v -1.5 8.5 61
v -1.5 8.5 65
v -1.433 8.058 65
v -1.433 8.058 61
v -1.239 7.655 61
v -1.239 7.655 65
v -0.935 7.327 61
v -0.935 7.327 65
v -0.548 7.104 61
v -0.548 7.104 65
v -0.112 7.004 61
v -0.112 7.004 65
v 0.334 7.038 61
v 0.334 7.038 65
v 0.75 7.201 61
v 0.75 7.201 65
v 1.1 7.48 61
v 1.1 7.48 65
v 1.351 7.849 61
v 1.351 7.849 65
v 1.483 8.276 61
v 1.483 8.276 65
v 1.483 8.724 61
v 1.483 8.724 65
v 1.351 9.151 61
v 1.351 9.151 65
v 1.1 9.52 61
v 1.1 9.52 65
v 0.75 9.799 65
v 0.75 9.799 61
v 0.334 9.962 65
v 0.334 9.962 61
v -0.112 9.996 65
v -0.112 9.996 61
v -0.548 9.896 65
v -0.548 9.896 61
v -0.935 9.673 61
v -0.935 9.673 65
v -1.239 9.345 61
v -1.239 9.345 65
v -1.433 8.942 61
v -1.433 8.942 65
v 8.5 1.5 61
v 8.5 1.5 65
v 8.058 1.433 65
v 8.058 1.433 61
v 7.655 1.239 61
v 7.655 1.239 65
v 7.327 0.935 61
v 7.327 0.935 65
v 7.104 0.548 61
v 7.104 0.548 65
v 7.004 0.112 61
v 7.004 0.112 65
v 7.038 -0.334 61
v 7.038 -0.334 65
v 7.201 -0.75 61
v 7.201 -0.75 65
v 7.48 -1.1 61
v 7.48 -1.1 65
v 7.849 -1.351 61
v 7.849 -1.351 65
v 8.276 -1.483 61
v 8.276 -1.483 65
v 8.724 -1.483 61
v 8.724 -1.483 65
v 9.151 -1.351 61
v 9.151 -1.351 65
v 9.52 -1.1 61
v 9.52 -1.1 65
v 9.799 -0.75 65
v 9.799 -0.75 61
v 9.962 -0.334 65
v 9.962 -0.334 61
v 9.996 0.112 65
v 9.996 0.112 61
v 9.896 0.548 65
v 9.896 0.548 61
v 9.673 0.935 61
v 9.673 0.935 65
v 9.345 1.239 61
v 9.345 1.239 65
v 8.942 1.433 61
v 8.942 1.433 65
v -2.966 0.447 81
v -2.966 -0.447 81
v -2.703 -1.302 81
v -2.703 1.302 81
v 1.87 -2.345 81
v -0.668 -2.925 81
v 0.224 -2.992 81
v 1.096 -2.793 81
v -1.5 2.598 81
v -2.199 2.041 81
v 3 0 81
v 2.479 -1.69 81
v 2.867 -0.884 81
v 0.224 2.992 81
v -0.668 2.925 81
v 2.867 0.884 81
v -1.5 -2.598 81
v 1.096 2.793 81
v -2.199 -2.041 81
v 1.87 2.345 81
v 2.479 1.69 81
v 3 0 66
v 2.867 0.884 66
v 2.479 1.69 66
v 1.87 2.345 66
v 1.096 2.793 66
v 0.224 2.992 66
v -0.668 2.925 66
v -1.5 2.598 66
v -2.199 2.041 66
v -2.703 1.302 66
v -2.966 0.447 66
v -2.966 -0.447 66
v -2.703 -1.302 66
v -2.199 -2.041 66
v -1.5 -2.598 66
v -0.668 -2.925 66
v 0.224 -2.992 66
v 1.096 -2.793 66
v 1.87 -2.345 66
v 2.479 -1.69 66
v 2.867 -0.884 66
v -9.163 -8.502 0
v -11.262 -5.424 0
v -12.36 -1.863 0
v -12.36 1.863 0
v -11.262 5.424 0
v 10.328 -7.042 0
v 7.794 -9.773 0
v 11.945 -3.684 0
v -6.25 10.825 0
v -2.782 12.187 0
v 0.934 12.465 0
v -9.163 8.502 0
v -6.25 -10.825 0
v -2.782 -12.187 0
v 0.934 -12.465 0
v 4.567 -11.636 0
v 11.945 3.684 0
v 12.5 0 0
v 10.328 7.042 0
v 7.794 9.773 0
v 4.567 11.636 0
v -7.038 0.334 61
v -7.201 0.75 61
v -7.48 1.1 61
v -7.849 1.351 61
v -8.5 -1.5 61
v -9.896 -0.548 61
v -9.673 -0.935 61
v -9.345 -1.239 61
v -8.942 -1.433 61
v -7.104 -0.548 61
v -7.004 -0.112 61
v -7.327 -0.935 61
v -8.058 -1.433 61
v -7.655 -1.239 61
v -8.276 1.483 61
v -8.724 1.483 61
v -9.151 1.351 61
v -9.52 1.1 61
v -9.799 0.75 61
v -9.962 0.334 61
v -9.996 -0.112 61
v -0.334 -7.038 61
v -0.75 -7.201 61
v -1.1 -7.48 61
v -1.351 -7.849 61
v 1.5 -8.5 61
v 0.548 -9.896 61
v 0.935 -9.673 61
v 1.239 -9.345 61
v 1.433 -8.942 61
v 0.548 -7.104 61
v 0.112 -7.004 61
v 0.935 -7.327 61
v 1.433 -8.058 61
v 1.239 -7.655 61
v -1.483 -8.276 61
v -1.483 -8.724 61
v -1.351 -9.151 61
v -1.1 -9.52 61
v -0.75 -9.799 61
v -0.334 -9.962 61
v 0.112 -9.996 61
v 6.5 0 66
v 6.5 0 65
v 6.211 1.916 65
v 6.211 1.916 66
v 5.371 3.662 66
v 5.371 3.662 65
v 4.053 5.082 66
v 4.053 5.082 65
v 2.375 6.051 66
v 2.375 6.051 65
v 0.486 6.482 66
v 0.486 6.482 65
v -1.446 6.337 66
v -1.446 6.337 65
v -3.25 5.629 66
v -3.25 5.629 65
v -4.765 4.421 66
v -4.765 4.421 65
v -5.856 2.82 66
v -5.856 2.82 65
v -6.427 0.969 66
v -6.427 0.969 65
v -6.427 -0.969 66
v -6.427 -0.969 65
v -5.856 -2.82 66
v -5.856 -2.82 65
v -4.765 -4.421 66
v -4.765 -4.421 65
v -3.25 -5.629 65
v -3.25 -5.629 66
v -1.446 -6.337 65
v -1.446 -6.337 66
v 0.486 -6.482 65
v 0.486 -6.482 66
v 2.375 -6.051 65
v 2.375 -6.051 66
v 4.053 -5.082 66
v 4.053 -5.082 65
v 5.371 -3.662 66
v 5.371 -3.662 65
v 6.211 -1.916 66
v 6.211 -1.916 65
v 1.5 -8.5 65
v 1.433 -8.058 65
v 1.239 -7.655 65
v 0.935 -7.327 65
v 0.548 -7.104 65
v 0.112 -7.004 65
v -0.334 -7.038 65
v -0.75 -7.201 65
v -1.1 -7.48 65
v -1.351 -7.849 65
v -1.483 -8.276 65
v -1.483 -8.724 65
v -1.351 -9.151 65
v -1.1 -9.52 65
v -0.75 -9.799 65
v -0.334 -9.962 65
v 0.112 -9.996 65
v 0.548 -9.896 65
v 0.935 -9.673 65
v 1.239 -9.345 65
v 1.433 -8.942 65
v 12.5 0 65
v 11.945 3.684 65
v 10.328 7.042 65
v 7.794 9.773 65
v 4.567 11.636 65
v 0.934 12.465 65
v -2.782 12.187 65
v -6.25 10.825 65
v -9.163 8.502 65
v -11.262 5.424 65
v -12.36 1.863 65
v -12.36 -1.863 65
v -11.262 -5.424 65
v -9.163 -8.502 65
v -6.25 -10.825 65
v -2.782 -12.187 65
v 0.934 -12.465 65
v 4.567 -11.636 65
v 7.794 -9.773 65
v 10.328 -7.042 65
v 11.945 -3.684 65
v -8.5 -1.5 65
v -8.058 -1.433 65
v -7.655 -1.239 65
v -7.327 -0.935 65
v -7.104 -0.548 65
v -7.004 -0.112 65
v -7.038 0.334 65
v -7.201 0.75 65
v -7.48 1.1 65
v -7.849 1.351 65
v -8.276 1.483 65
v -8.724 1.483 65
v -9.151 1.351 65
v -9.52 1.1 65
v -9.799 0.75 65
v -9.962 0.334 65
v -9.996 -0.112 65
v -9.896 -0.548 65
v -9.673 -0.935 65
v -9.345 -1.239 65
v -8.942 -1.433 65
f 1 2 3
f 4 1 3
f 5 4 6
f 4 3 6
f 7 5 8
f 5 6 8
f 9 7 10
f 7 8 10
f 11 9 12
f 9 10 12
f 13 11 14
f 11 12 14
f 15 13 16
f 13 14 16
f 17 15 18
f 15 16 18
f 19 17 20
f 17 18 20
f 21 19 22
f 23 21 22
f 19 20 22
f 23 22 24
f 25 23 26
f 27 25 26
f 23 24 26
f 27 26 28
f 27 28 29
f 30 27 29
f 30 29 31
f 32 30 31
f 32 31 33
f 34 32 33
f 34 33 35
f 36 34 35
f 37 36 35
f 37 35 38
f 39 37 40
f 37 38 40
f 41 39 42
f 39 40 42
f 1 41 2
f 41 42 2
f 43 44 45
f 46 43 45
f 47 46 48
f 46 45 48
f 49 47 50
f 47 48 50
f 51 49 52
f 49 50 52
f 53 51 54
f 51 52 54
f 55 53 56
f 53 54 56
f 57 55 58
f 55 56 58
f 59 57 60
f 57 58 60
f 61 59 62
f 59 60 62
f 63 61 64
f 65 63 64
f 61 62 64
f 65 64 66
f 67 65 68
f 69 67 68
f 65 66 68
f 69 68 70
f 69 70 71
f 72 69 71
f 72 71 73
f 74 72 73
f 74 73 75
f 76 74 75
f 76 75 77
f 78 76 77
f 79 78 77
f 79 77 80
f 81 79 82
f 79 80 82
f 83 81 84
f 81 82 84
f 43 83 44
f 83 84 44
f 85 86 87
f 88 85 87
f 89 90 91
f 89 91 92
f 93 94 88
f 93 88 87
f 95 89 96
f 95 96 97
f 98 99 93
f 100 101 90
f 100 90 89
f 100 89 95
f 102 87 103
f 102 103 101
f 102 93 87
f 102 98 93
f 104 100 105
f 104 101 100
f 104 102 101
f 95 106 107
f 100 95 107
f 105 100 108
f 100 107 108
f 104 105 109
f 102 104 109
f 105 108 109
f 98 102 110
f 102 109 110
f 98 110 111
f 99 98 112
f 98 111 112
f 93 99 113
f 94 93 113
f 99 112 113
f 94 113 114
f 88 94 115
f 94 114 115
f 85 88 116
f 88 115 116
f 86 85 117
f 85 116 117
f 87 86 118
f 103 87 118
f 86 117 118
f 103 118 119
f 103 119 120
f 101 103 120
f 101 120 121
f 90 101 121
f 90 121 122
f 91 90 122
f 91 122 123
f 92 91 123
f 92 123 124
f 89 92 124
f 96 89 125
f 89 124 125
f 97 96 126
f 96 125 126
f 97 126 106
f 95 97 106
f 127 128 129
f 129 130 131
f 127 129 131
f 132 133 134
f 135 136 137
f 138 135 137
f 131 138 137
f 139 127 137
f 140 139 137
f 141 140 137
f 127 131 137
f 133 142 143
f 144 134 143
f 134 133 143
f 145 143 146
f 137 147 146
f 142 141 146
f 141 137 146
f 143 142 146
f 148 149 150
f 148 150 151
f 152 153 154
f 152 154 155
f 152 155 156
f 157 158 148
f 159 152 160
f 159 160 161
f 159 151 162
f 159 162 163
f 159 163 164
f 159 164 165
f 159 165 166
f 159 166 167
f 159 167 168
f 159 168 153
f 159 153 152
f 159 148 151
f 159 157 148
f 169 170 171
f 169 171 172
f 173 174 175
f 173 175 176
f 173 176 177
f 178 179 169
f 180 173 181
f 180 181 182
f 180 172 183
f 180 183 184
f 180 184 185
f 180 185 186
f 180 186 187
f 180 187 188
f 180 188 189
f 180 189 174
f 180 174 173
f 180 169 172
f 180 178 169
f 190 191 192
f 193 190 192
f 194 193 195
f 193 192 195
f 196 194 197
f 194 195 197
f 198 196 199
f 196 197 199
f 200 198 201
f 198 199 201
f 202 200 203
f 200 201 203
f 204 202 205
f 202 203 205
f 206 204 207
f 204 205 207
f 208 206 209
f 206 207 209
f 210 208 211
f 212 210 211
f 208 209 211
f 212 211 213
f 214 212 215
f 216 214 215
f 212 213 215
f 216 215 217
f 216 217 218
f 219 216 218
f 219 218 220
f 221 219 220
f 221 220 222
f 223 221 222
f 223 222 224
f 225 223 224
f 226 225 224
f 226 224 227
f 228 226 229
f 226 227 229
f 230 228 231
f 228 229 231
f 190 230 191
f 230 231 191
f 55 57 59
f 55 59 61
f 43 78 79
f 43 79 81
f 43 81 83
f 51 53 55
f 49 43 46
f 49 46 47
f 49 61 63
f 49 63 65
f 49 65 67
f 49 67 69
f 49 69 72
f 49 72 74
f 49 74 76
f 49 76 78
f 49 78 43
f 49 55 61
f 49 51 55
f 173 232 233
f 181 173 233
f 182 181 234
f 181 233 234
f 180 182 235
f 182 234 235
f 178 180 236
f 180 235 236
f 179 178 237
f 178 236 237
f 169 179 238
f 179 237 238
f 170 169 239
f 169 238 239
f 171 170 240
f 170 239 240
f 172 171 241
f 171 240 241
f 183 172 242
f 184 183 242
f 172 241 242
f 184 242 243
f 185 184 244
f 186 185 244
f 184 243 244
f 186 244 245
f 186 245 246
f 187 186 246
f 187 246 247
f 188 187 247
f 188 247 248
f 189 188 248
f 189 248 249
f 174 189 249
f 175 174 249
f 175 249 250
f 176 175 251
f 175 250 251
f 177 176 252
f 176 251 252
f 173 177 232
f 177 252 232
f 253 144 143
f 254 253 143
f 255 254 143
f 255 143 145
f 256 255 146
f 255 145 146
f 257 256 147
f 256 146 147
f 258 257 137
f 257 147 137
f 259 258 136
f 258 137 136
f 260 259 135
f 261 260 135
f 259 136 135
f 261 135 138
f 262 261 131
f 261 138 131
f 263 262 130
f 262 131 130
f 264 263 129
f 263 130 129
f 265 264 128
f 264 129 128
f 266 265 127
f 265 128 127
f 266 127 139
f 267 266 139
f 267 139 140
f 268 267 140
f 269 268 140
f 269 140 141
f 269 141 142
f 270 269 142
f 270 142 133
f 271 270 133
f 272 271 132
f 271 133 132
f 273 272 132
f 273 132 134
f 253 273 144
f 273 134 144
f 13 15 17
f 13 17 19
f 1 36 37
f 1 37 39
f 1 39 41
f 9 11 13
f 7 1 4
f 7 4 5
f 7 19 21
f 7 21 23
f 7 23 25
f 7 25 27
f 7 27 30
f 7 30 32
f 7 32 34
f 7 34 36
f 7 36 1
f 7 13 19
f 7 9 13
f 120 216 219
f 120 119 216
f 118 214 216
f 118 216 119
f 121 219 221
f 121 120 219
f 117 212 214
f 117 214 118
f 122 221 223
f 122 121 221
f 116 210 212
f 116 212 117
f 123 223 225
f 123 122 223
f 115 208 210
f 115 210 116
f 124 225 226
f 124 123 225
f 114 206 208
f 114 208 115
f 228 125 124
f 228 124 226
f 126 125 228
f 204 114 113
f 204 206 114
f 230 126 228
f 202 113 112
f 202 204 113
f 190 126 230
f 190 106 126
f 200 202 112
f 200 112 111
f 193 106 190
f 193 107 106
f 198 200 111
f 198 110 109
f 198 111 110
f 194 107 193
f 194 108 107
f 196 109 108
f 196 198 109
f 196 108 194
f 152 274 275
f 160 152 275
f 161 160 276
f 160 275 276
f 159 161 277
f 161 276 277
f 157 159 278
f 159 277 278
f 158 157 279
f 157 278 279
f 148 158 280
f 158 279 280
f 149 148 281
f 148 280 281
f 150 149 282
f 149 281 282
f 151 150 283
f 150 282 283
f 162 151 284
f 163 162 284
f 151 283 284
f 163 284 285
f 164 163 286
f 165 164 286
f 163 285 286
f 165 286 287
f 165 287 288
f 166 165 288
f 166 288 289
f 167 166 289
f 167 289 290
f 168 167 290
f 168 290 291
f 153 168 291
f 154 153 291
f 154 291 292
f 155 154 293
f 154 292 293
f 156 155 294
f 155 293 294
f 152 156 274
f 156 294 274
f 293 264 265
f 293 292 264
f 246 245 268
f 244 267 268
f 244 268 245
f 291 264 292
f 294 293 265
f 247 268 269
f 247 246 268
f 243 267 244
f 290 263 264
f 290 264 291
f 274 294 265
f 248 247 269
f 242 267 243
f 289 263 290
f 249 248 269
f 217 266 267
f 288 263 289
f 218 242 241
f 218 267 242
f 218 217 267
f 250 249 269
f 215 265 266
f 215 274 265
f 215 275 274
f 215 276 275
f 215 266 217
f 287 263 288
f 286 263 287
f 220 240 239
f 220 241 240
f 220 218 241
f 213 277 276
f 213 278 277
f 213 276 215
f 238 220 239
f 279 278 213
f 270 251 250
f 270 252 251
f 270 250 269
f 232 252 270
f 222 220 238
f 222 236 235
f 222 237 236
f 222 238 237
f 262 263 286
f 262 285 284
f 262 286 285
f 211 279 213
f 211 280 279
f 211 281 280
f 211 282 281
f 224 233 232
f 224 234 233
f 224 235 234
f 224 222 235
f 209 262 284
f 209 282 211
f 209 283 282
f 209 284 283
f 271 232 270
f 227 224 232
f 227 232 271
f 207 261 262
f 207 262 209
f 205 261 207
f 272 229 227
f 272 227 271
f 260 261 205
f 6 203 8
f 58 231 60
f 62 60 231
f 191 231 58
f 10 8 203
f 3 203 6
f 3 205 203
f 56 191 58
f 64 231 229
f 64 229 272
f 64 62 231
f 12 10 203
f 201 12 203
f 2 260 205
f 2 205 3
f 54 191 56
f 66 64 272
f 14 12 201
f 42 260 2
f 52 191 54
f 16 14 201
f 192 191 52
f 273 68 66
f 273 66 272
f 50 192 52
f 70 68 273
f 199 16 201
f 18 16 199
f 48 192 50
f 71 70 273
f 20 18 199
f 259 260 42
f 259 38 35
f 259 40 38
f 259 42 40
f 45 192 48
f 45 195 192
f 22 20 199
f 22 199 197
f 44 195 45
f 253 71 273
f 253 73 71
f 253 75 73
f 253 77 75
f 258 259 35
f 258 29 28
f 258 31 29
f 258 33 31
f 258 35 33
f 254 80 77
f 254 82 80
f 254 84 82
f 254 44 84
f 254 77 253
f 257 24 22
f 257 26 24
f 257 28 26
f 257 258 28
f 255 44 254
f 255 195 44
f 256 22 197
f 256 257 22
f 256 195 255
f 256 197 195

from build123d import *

# Parameters (mm, degrees)
ESBO_O1_R                = 12.5
RESSALTO_EXTRUS_O1_DEPTH = 65
ESBO_O2_R                = 6.5
RESSALTO_EXTRUS_O2_DEPTH = 1
ESBO_O3_R                = 3
RESSALTO_EXTRUS_O3_DEPTH = 15
ESBO_O4_R                = 1.5
CORTE_EXTRUS_O1_DEPTH    = 4
PADR_OCIRCULAR1_COUNT    = 4


with BuildPart() as part:
    # Esboço1 → Ressalto-extrusão1 (new body)
    with BuildSketch(Plane.XY):
        Circle(ESBO_O1_R)
    extrude(amount=RESSALTO_EXTRUS_O1_DEPTH)

    # Esboço2 → Ressalto-extrusão2 (add)
    with BuildSketch(Plane.XY.offset(65)):
        Circle(ESBO_O2_R)
    extrude(amount=RESSALTO_EXTRUS_O2_DEPTH)

    # Esboço3 → Ressalto-extrusão3 (add)
    with BuildSketch(Plane.XY.offset(66)):
        Circle(ESBO_O3_R)
    extrude(amount=RESSALTO_EXTRUS_O3_DEPTH)

    # Esboço4 → Corte-extrusão1 (cut)
    with BuildSketch(Plane.XY.offset(65)):
        with Locations((0, -8.5)):
            Circle(ESBO_O4_R)
    corte_extrus_o1 = extrude(amount=-CORTE_EXTRUS_O1_DEPTH, mode=Mode.SUBTRACT)

    # PadrãoCircular1: Corte-extrusão1 ×4 about axis
    padr_ocircular1_axis = Axis((0, 0, 0), (0, 0, 1))
    for i in range(1, PADR_OCIRCULAR1_COUNT):
        add(corte_extrus_o1.rotate(padr_ocircular1_axis, i * 360 / PADR_OCIRCULAR1_COUNT), mode=Mode.SUBTRACT)


solid = part.part
